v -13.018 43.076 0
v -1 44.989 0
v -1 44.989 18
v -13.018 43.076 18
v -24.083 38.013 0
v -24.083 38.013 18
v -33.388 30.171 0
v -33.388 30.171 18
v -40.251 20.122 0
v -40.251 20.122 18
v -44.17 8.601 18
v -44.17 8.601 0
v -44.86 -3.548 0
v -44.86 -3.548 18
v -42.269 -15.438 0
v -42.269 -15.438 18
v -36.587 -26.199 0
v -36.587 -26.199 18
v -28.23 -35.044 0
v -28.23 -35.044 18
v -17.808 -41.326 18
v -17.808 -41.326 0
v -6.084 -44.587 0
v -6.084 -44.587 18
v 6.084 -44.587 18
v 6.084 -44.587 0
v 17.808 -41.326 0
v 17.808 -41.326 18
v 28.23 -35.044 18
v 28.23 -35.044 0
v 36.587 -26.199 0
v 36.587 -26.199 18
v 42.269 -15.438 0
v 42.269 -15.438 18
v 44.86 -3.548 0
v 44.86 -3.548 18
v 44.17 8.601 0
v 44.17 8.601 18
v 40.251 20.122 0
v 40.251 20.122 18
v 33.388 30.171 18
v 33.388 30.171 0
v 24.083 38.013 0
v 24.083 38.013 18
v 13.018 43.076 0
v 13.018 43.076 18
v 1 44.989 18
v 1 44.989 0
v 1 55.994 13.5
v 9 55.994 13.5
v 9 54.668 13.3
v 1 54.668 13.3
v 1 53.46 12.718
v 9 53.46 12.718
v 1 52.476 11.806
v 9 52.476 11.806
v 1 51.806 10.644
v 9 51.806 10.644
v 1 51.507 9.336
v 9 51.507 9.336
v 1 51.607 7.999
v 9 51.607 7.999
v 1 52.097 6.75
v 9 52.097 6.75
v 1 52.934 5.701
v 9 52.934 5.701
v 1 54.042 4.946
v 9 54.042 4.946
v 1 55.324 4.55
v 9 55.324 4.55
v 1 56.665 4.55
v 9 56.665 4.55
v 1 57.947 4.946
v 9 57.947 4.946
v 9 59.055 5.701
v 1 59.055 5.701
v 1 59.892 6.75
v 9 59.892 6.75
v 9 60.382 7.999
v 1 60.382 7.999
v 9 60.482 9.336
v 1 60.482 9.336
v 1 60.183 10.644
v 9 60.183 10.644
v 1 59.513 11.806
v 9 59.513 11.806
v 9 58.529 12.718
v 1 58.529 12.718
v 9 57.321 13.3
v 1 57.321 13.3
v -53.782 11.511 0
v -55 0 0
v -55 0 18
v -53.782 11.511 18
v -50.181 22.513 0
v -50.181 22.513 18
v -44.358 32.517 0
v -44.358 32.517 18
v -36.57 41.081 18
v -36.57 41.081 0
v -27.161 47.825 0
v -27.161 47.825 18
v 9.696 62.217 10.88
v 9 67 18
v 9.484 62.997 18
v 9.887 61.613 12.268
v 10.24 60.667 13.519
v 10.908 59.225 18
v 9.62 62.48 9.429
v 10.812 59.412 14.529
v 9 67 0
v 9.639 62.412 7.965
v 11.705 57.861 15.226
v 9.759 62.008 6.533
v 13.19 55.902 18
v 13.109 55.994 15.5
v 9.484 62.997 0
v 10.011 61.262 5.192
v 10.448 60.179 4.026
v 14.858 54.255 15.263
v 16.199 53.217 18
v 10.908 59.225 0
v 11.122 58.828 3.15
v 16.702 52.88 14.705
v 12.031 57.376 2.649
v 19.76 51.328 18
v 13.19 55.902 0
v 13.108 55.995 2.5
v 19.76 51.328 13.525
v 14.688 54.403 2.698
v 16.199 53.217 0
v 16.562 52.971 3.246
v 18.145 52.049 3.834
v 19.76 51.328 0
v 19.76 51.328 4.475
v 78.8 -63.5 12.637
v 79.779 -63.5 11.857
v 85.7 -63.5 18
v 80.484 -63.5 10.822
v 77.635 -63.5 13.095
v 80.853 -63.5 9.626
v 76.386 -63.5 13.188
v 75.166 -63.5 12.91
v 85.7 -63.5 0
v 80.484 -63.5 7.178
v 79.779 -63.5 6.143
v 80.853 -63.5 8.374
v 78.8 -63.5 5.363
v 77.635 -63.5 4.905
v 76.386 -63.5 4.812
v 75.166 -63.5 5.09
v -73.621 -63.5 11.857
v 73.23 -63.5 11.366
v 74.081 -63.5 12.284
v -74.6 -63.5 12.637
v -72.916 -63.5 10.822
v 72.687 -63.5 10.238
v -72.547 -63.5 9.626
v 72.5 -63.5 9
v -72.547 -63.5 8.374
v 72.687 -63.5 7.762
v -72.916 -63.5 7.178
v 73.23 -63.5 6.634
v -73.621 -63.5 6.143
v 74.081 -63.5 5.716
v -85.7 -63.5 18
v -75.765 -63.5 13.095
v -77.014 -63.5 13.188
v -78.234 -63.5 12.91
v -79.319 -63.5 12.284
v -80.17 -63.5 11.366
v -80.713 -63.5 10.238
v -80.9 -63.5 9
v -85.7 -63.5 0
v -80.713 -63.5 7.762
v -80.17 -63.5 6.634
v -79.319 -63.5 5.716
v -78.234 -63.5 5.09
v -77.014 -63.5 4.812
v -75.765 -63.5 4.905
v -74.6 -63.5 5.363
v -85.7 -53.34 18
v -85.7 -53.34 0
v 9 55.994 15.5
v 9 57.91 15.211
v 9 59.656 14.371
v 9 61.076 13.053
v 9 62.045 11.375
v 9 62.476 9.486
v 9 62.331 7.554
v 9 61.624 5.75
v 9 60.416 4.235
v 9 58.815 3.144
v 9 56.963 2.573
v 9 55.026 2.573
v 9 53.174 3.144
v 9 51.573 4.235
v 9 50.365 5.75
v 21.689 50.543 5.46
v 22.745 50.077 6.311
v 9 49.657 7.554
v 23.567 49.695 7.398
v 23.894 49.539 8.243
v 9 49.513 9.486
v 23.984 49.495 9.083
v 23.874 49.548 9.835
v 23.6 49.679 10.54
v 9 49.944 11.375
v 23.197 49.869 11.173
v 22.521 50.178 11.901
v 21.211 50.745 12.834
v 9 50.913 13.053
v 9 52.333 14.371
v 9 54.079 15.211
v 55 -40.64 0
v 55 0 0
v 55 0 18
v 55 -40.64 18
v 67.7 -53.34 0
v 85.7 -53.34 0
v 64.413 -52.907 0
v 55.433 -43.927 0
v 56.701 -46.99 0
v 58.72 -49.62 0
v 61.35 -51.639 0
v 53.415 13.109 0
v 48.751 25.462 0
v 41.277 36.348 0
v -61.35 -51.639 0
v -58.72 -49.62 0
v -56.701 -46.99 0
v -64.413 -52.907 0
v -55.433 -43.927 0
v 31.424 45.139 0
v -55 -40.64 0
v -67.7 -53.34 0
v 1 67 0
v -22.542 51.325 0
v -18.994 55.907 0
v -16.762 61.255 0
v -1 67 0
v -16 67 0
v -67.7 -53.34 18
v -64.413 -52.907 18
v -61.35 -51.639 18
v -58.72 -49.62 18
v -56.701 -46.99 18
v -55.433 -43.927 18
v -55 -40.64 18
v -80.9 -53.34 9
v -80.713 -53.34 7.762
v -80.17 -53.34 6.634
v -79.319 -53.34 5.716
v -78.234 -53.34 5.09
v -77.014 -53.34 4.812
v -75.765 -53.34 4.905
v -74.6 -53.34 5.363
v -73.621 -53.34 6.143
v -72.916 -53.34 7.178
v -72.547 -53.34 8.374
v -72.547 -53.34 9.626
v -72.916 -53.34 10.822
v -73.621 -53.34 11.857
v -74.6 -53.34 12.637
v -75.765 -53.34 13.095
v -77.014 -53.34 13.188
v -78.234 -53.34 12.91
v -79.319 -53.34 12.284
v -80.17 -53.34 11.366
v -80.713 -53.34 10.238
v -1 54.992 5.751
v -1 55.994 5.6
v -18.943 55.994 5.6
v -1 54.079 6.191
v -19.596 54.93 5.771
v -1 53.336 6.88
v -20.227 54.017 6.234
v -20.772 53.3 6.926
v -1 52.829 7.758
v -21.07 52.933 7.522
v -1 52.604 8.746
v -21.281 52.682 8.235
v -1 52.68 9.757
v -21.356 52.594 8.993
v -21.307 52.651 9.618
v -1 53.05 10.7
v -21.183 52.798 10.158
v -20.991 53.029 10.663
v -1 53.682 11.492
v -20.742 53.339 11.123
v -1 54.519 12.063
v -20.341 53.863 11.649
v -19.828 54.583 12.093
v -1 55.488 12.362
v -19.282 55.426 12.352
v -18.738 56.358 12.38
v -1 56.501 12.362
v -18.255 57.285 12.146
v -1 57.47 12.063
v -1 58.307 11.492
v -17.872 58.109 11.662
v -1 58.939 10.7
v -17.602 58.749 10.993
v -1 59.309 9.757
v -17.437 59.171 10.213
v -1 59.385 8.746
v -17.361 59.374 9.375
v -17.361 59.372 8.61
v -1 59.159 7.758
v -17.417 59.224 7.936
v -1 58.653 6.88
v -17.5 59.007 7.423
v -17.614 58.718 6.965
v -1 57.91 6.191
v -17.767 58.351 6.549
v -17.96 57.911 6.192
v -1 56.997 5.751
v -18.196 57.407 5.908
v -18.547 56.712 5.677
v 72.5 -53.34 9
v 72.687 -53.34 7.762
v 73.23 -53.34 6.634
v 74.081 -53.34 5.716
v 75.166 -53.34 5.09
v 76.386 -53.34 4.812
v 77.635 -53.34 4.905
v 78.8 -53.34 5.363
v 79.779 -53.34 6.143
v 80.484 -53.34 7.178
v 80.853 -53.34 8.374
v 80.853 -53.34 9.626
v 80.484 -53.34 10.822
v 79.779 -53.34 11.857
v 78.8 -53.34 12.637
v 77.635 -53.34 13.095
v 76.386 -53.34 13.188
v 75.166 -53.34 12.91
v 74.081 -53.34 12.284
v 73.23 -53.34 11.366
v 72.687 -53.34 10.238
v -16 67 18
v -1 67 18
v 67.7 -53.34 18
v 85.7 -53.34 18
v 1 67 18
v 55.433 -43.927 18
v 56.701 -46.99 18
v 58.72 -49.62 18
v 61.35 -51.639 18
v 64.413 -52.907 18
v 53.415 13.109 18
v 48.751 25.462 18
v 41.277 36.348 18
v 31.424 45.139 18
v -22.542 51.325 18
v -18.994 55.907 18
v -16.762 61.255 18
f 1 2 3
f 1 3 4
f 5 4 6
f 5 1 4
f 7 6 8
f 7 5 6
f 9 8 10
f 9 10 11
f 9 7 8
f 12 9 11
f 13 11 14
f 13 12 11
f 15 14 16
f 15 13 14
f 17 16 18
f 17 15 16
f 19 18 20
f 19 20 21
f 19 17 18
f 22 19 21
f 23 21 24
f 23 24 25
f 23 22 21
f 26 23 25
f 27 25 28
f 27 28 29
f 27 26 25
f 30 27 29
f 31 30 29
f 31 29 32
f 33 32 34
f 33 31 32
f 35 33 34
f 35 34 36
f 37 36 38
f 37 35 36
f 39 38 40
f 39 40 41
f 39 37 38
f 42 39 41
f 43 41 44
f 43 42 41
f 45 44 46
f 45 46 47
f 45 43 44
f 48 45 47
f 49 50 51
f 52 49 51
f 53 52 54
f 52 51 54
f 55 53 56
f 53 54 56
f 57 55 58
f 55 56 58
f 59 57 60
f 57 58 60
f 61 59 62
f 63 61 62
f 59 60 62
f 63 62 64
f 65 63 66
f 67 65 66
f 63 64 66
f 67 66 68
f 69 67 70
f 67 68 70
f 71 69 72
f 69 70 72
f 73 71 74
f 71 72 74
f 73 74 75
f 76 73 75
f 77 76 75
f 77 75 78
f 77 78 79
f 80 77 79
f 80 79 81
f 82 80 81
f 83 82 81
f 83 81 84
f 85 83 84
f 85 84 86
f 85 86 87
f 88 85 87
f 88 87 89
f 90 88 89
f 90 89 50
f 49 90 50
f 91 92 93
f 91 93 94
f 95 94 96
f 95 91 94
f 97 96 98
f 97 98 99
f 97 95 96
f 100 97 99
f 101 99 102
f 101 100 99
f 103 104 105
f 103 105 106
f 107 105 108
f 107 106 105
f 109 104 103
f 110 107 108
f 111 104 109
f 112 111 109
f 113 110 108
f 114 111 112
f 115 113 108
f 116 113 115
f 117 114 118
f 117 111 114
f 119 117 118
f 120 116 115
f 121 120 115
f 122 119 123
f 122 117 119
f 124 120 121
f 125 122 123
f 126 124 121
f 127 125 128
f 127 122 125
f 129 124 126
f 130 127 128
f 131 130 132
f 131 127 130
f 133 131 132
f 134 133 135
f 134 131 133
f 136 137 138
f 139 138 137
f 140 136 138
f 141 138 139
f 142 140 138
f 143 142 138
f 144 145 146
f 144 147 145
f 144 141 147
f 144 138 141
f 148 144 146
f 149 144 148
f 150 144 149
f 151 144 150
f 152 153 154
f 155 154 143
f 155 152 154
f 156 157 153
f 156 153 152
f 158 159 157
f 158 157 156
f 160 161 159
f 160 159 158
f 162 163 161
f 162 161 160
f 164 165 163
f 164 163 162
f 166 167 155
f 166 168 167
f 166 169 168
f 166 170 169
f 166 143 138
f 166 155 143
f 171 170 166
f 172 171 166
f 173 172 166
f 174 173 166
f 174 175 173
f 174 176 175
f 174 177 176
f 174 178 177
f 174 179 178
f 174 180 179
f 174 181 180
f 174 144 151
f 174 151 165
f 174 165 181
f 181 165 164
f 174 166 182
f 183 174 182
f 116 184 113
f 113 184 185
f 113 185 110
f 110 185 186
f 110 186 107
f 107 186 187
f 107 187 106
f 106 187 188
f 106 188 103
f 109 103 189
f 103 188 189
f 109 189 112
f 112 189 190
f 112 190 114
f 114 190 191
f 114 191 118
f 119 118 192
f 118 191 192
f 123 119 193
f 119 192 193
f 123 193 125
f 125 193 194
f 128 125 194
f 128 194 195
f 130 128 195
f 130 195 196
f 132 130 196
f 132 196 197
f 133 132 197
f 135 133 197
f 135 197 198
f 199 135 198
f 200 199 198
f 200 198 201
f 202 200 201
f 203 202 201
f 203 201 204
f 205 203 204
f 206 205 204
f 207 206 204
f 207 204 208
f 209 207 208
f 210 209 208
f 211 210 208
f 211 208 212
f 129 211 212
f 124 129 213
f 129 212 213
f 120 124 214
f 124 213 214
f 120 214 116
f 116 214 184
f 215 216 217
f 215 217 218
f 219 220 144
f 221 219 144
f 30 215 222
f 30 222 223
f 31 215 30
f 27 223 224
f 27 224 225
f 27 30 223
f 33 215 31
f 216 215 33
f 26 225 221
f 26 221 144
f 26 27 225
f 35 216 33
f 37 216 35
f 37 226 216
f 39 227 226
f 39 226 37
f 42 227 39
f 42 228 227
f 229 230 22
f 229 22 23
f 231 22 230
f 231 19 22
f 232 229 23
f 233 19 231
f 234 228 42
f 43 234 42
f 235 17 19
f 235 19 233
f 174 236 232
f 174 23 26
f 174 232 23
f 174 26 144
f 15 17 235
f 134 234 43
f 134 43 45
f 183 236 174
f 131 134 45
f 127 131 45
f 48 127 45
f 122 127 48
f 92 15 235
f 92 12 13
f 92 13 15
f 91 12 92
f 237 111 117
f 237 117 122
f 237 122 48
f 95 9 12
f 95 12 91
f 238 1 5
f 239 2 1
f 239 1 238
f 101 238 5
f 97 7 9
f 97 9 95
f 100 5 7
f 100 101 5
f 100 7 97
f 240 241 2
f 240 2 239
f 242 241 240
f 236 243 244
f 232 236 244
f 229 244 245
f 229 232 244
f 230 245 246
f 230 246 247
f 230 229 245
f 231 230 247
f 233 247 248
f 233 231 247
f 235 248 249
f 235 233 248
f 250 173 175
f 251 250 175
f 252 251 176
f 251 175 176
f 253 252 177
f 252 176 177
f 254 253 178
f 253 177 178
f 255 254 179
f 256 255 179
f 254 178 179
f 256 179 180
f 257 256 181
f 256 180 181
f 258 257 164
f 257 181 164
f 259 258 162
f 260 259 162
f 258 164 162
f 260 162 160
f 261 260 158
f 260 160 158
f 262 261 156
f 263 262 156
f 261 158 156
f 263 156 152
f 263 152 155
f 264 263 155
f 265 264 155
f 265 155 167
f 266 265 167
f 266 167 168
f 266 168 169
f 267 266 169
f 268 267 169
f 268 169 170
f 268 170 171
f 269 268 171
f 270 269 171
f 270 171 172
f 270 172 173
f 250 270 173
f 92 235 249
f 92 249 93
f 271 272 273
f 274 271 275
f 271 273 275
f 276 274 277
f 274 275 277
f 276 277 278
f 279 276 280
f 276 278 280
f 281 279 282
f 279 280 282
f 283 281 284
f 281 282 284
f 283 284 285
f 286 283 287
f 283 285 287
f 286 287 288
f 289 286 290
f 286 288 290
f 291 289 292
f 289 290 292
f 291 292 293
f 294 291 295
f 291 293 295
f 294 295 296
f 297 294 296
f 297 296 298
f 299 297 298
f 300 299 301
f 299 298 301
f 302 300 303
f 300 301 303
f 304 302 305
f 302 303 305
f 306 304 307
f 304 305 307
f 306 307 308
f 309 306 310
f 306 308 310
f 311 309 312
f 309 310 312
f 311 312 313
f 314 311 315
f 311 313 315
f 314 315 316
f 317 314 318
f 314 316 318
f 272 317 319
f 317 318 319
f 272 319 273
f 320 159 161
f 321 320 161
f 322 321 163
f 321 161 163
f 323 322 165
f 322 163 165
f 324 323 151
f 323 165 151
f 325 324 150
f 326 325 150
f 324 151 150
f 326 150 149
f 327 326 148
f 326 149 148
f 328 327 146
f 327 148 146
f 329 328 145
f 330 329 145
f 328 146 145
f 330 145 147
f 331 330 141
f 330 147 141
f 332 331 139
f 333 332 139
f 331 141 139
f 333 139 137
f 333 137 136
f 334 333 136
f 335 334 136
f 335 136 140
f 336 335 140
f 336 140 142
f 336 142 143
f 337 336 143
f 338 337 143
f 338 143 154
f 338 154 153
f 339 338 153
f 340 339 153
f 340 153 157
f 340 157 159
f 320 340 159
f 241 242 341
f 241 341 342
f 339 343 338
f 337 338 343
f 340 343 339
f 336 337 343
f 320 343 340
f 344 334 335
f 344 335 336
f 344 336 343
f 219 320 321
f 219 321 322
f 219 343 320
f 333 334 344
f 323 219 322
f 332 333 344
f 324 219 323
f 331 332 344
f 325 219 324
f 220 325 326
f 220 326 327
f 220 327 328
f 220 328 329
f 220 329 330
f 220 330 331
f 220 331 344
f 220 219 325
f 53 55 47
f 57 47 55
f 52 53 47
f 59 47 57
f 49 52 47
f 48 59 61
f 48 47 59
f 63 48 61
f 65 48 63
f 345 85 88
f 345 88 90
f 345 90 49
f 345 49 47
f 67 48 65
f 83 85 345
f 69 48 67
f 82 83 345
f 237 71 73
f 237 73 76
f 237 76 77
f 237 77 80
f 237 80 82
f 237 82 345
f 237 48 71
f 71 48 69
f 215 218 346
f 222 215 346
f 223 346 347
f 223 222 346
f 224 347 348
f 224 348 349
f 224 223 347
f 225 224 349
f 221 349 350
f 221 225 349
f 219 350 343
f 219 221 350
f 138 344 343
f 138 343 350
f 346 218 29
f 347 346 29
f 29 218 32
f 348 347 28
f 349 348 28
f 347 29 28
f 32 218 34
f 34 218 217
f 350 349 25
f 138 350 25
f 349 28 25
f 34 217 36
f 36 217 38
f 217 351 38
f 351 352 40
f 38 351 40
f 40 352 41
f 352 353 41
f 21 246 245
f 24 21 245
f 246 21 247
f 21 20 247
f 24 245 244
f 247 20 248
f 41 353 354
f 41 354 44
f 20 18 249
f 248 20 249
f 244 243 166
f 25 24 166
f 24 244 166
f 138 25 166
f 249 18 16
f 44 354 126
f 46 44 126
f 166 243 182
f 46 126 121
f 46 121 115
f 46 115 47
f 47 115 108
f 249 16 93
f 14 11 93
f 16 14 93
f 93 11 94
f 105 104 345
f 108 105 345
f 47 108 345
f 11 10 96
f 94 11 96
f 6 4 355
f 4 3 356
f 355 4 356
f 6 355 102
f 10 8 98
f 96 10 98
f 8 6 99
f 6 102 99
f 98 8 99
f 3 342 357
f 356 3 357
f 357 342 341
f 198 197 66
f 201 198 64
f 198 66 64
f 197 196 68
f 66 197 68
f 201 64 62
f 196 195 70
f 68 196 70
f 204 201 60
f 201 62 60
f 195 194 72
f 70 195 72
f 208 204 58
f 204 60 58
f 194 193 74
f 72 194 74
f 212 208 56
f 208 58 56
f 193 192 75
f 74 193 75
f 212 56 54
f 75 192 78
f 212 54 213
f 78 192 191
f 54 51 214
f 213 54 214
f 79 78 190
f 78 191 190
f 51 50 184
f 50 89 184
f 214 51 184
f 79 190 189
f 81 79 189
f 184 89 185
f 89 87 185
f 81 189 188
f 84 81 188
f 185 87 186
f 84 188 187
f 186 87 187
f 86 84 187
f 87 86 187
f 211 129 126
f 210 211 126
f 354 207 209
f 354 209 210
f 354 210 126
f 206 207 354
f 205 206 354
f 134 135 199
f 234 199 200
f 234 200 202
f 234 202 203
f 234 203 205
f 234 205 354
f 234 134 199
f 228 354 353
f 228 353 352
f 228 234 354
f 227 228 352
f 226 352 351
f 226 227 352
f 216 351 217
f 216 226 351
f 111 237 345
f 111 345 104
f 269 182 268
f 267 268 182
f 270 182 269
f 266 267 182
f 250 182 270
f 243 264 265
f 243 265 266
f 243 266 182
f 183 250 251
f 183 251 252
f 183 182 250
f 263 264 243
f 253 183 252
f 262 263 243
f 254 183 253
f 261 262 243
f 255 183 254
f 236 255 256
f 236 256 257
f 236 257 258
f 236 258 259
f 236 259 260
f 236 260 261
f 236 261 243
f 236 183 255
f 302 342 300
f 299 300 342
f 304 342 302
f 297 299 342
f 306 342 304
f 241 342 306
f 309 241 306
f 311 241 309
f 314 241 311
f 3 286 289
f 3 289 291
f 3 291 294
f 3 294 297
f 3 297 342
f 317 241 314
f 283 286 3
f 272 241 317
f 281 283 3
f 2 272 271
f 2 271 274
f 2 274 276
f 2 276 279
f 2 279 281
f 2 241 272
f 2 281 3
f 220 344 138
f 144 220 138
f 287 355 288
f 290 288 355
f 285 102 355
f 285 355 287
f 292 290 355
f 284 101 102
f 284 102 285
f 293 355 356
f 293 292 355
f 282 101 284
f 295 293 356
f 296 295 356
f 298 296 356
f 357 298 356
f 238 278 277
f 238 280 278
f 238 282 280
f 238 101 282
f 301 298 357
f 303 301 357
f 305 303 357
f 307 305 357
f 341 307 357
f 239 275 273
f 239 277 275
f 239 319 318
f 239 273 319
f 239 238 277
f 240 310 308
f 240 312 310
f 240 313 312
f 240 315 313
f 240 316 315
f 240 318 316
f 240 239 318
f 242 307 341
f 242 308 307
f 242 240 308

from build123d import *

# Parameters (mm, degrees)
MAIN_BODY_DEPTH               = 18
SKETCH10_R                    = 6.5
HEAD_COUNTERBORE_DEPTH        = 18
TO_TABLE_M8_CLEARANCE_HOLE1_D = 8.4
SKETCH19_W                    = 3.4
SKETCH19_H                    = 84.7
M8_CLEARANCE_HOLE2_REACH      = 119.393
M8_CLEARANCE_HOLE2_BORE_R     = 4.5


with BuildPart() as part:
    # Sketch1 → main body (new body)
    with BuildSketch(Plane.XY):
        with BuildLine():
            Line((85.7, -53.34), (85.7, -63.5))
            Line((85.7, -63.5), (-85.7, -63.5))
            Line((-85.7, -63.5), (-85.7, -53.34))
            Line((-85.7, -53.34), (-67.7, -53.34))
            ThreePointArc((-67.7, -53.34), (-58.719743879, -49.620256121), (-55, -40.64))
            Line((-55, -40.64), (-55, 0))
            ThreePointArc((-55, 0), (-47.533550635, 27.668783205), (-27.161397671, 47.825291181))
            ThreePointArc((-27.161397671, 47.825291181), (-18.99354147, 55.906688319), (-16, 67))
            Line((-16, 67), (-1, 67))
            Line((-1, 67), (-1, 44.988887517))
            ThreePointArc((-1, 44.988887517), (0, -45), (1, 44.988887517))
            Line((1, 44.988887517), (1, 67))
            Line((1, 67), (9, 67))
            ThreePointArc((9, 67), (11.948921757, 57.494782102), (19.76003028, 51.327781983))
            ThreePointArc((19.76003028, 51.327781983), (45.342042661, 31.130357648), (55, 0))
            Line((55, 0), (55, -40.64))
            ThreePointArc((55, -40.64), (58.719743879, -49.620256121), (67.7, -53.34))
            Line((67.7, -53.34), (85.7, -53.34))
        make_face()
    extrude(amount=MAIN_BODY_DEPTH)

    # Sketch10 → head counterbore (cut)
    with BuildSketch(Plane.ZY.offset(-9)):
        with Locations((9, 55.994443758)):
            Circle(SKETCH10_R)
    extrude(amount=-HEAD_COUNTERBORE_DEPTH, mode=Mode.SUBTRACT)

    # to table M8 Clearance Hole1 (through all)
    with Locations(Plane(origin=(0, -53.34, 0), x_dir=(1, 0, 0), z_dir=(0, 1, 0))):
        with Locations((-76.7, -9), (76.7, -9)):
            Hole(TO_TABLE_M8_CLEARANCE_HOLE1_D / 2)

    # Sketch19 → M8x1.25 Tapped Hole1 (revolve, cut)
    with BuildSketch(Plane(origin=(-1, 55.994443758, 9), x_dir=(0, 0, -1), z_dir=(0, 1, 0))):
        with Locations((1.7, 42.35)):
            Rectangle(SKETCH19_W, SKETCH19_H)
    revolve(axis=Axis((5.35, 55.994443758, 9), (-1, 0, 0)), mode=Mode.SUBTRACT)

    # M8 Clearance Hole2 bore → M8 Clearance Hole2 (cut, up to next)
    with BuildSketch(Plane(origin=(9, 0, 0), x_dir=(0, 0, 1), z_dir=(1, 0, 0)), mode=Mode.PRIVATE) as m8_clearance_hole2_sk1:
        with Locations((9, -55.994443758)):
            Circle(M8_CLEARANCE_HOLE2_BORE_R)
    m8_clearance_hole2_tool1 = extrude(m8_clearance_hole2_sk1.sketch, amount=-M8_CLEARANCE_HOLE2_REACH, mode=Mode.PRIVATE) & part.part
    add(m8_clearance_hole2_tool1.solids().sort_by_distance((9, 55.994444, 9))[0], mode=Mode.SUBTRACT)


solid = part.part
